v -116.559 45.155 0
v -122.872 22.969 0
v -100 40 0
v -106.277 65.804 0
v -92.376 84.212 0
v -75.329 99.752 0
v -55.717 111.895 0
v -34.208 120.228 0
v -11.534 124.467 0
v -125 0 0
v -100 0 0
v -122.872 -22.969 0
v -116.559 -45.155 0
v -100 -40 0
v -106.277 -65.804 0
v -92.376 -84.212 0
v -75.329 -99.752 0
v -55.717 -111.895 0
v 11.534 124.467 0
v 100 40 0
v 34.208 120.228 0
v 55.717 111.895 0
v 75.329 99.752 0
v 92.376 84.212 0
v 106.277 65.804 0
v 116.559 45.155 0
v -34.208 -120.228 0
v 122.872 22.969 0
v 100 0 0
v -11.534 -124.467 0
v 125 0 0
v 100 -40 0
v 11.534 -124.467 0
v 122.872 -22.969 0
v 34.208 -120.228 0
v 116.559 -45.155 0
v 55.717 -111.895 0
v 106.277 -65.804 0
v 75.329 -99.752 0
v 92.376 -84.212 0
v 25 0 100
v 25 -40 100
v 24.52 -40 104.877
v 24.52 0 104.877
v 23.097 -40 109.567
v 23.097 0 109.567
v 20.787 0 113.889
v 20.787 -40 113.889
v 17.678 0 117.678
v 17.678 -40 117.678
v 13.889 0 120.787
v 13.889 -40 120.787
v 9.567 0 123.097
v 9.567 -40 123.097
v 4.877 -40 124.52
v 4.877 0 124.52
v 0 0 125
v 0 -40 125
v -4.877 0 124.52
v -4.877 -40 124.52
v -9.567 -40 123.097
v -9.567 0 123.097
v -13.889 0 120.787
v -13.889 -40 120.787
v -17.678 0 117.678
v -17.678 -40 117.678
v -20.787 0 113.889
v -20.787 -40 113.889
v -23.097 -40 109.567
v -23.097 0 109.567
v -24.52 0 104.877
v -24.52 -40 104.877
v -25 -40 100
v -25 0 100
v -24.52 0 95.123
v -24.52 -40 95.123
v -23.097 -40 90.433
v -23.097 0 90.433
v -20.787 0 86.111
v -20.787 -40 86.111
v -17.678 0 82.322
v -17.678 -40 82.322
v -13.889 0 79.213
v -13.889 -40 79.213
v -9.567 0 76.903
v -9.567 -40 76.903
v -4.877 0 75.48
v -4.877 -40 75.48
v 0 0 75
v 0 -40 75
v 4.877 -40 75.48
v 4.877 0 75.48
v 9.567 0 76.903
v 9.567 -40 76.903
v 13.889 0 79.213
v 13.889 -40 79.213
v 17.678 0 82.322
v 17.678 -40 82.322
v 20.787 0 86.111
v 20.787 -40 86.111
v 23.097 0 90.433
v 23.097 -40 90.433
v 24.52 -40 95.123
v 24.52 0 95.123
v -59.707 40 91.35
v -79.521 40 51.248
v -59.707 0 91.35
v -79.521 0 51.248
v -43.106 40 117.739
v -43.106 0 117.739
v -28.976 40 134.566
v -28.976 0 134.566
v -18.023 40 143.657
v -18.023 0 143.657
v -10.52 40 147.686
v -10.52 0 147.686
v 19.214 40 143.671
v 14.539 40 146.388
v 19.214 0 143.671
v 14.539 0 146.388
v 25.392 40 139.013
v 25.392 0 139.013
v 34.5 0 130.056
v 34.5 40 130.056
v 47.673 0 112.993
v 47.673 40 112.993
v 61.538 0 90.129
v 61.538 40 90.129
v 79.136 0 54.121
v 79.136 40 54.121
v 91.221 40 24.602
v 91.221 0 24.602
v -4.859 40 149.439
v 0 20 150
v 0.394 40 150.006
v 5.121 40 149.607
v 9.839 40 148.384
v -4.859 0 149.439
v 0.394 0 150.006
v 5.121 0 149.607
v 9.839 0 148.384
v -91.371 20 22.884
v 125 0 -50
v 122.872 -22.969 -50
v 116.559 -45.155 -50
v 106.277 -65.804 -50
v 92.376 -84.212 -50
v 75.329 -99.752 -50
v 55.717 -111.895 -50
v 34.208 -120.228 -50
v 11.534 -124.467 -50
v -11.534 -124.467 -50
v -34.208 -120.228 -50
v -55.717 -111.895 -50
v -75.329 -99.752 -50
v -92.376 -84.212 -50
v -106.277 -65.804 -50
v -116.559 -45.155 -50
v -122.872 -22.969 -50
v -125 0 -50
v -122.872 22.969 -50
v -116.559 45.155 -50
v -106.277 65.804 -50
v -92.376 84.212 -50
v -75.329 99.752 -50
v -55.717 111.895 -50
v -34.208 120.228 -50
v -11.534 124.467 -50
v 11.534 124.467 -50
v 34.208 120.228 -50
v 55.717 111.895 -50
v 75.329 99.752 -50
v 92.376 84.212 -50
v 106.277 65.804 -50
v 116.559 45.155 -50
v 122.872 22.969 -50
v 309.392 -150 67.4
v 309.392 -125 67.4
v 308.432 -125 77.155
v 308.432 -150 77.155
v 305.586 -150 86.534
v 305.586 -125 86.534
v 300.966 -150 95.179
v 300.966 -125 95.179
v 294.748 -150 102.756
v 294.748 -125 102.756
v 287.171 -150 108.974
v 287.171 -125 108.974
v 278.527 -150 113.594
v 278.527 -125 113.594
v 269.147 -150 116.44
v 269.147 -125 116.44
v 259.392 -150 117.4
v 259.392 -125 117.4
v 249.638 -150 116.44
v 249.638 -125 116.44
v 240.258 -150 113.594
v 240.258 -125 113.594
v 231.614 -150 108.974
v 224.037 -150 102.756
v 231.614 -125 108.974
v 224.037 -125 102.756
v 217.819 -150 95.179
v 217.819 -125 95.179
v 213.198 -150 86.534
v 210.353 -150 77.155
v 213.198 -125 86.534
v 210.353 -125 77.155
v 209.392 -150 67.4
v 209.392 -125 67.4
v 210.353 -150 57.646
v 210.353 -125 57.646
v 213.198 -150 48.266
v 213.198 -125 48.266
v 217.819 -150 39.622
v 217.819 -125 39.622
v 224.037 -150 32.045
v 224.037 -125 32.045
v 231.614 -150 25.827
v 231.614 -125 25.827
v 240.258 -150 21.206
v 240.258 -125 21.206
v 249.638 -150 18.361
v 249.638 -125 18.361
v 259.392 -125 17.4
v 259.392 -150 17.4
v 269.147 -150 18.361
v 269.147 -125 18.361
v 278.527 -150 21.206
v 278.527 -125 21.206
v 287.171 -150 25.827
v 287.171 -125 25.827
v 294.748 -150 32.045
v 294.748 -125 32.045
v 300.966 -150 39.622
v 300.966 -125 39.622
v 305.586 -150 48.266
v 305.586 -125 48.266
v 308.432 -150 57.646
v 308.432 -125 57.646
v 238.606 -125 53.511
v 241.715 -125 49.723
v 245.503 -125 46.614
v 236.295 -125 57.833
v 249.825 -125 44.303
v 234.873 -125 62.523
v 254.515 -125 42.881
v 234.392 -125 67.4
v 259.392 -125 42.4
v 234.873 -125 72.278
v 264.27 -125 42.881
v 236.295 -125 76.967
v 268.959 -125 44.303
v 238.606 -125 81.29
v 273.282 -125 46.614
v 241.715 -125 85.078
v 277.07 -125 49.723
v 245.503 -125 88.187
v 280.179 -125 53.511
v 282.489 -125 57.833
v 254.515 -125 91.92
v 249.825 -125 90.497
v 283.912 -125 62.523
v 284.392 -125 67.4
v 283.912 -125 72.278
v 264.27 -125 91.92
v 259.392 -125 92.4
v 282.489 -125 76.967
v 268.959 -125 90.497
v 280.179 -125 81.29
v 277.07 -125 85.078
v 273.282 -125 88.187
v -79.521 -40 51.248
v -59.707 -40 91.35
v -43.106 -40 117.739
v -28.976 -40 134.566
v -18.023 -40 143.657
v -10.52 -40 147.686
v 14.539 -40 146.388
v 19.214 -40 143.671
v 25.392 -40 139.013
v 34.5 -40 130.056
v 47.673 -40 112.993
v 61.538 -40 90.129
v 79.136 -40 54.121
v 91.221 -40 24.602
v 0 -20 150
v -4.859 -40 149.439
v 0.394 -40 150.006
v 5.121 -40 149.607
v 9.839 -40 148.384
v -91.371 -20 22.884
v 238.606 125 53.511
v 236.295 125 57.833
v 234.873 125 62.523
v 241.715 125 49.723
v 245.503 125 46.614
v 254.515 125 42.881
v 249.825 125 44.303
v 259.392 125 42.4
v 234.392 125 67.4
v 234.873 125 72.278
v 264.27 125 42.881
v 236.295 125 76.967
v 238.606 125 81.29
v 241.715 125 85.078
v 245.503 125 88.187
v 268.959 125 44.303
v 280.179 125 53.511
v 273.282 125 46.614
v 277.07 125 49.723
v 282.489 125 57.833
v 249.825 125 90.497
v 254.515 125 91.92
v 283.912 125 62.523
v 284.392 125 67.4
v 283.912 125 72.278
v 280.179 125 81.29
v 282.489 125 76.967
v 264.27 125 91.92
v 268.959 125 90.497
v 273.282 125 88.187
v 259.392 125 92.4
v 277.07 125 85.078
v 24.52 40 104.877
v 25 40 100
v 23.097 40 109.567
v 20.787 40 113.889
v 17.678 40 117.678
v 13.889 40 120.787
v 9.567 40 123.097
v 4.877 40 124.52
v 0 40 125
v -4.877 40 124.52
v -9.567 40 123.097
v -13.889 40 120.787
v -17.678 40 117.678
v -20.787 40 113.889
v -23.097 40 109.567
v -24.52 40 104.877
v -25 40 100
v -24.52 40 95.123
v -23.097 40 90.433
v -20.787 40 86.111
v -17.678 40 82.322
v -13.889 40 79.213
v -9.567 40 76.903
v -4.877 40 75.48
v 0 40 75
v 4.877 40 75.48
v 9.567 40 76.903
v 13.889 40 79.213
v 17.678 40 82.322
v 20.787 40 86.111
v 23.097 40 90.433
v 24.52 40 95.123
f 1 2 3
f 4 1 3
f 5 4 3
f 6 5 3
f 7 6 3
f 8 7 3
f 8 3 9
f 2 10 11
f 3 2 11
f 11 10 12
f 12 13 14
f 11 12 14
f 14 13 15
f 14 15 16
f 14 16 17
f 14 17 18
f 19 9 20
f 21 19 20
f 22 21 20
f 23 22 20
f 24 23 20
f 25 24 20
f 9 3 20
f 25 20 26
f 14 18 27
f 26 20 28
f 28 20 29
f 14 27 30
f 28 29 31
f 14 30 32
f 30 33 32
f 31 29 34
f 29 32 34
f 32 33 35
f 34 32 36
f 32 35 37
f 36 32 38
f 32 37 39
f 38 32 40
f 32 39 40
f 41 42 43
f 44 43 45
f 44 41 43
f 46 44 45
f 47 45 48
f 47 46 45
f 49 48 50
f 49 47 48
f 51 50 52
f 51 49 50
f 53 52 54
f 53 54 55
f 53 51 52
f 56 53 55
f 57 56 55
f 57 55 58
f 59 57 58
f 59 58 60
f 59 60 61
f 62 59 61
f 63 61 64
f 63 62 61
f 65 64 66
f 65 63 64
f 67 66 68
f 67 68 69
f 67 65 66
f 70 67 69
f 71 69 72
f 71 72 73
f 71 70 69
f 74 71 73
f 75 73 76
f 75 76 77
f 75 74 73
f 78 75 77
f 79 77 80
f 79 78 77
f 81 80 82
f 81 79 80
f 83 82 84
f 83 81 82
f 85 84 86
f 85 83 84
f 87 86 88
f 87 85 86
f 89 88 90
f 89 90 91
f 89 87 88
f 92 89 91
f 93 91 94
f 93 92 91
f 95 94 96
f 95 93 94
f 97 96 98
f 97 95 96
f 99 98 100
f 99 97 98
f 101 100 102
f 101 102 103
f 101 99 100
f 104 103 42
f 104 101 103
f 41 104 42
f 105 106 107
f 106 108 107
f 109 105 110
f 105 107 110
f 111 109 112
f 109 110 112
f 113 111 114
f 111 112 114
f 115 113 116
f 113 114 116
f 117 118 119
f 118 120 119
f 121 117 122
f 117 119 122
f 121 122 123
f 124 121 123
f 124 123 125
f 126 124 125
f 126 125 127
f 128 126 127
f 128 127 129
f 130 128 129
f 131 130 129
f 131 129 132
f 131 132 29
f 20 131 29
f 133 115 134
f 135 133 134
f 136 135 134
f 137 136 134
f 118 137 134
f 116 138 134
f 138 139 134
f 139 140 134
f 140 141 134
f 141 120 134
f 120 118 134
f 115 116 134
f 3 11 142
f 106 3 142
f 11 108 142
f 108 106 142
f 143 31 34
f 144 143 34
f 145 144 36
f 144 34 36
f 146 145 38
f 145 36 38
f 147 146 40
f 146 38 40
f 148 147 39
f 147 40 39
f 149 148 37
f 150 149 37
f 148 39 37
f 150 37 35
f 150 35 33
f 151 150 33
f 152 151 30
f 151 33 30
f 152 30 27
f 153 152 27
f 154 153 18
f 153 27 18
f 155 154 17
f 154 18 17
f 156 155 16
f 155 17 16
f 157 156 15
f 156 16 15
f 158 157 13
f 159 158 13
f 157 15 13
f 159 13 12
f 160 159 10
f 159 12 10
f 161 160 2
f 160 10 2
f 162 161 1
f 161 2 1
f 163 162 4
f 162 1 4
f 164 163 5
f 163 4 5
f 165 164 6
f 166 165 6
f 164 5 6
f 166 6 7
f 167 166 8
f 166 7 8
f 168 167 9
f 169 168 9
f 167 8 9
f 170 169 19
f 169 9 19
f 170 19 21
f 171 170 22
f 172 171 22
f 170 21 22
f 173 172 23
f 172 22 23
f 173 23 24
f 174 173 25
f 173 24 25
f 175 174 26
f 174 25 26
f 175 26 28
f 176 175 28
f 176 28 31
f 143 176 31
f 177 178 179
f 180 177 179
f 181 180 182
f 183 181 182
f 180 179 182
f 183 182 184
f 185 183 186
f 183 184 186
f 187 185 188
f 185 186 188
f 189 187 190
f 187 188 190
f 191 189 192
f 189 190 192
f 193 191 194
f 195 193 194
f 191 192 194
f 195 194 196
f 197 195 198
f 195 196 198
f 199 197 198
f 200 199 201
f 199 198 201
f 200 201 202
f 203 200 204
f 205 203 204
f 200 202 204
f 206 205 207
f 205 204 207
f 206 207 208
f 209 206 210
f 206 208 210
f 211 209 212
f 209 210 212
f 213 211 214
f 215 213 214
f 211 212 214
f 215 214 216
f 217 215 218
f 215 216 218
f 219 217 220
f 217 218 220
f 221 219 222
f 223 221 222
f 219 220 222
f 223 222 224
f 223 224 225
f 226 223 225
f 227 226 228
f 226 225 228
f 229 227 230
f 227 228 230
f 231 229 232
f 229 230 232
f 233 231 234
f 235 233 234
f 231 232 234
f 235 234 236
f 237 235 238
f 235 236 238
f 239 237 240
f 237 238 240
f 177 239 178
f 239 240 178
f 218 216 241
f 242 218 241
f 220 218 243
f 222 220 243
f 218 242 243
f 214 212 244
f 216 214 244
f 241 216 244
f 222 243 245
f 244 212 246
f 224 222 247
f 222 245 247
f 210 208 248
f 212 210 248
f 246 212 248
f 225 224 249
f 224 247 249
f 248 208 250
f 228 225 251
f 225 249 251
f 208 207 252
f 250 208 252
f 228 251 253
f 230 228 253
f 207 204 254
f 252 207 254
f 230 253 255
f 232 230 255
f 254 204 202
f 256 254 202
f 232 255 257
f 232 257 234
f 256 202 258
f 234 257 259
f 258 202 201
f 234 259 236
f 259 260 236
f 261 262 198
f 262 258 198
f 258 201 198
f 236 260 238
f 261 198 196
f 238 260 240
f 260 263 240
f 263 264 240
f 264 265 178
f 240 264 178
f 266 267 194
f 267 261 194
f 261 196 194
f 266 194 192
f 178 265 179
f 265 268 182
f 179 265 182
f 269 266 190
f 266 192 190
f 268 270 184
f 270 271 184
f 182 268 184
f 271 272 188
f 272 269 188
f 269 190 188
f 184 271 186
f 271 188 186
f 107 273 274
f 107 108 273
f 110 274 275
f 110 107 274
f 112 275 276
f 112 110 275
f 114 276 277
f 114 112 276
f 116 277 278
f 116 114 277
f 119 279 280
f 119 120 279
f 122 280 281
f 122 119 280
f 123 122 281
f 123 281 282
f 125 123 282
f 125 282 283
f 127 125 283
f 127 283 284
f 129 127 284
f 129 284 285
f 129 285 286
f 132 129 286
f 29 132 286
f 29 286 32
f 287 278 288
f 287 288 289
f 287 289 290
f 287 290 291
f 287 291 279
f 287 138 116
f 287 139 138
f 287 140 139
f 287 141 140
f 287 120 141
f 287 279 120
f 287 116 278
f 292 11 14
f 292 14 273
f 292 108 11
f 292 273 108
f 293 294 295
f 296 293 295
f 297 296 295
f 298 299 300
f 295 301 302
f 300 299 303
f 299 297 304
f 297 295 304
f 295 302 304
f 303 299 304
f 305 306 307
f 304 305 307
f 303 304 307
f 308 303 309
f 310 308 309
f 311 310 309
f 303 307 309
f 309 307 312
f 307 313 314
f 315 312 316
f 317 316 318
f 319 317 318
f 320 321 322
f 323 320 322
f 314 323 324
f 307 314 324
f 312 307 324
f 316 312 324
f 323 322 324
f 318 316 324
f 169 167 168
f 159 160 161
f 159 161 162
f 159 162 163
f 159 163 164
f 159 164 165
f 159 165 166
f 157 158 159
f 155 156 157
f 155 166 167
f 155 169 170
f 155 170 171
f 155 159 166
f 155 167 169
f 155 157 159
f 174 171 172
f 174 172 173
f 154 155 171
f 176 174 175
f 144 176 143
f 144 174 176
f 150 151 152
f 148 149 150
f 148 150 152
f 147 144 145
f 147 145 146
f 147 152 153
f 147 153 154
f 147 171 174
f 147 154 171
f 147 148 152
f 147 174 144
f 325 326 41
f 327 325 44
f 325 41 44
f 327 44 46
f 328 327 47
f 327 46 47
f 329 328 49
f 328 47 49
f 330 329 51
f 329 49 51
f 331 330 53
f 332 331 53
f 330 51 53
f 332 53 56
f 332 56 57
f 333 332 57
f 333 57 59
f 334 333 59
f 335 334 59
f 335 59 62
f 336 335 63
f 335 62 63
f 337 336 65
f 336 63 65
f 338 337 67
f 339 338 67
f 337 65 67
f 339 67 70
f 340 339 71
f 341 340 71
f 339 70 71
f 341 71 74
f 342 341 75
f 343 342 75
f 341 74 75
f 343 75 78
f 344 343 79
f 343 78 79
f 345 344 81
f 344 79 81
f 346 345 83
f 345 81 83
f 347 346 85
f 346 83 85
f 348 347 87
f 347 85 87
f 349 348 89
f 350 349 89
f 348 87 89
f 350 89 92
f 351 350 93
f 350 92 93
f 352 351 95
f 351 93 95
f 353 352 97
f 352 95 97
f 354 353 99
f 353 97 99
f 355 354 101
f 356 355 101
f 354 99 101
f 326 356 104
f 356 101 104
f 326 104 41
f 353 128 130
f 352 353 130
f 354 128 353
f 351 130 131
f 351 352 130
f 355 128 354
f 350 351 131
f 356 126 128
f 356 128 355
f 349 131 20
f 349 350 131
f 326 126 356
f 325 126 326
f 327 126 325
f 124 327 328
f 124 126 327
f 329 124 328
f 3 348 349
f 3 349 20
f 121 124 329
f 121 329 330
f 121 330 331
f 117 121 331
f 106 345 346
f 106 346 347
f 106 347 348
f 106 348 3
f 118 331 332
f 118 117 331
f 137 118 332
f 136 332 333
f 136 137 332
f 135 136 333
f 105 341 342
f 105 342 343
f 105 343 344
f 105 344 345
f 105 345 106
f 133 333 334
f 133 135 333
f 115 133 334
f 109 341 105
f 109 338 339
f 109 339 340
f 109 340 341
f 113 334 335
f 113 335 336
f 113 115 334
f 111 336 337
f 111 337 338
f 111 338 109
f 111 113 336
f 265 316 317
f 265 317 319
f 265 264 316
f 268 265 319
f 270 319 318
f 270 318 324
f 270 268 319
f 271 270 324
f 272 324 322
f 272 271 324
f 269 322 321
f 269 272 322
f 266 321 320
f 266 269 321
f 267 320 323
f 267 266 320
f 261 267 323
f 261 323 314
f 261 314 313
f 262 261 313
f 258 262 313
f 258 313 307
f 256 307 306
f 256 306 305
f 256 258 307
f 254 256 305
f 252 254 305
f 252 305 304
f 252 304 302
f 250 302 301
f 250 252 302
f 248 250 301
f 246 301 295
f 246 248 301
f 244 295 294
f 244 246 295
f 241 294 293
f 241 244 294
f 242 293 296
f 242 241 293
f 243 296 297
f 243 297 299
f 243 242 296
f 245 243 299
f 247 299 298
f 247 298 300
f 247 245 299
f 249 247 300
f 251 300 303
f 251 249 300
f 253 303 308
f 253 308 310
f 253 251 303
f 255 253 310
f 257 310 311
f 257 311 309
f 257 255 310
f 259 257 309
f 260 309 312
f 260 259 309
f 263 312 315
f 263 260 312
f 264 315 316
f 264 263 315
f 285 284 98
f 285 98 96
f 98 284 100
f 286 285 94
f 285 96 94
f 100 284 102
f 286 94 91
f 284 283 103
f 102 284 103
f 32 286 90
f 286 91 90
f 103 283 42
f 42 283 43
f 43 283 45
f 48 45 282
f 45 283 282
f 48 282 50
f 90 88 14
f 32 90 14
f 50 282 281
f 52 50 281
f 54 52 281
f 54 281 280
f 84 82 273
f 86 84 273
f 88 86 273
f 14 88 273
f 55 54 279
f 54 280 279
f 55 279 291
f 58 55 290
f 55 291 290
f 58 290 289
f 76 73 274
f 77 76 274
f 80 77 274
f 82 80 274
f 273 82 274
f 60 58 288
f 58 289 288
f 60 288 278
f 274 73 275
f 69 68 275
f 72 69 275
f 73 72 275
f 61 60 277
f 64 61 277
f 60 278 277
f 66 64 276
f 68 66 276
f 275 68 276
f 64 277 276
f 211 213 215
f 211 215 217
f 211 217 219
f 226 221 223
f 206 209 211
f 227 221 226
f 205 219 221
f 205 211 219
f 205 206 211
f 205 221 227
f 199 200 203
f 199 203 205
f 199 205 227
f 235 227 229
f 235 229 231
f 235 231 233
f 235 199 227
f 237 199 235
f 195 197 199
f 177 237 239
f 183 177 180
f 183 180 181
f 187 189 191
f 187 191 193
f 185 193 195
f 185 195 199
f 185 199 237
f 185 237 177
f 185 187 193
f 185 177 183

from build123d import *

# Parameters (mm, degrees)
F0_R     = 25
F1_DEPTH = 40
F2_R     = 125
F3_DEPTH = 50
F4_R     = 25
F5_DEPTH = 125
F6_R     = 50
F7_DEPTH = 25


with BuildPart() as f1:
    # F0 (on Front) → F1 (new body, symmetric)
    with BuildSketch(Plane.XZ):
        with BuildLine():
            add(Edge.make_bspline(
                [(-100, 0), (-85, 41.621112), (0, 256.524127), (85, 45.330634), (100, 0)],
                knots=[0, 0, 0, 0, 180.277564, 360.555128, 360.555128, 360.555128, 360.555128], degree=3))
            Line((-100, 0), (100, 0))
        make_face()
        with Locations((0, 100)):
            Circle(F0_R, mode=Mode.SUBTRACT)
    extrude(amount=F1_DEPTH, both=True)

    # F2 (on face) → F3 (join)
    with BuildSketch(Plane(origin=(0, 0, 0), x_dir=(1, 0, 0), z_dir=(0, 0, -1))):
        Circle(F2_R)
        Polygon((100, 0), (100, -40), (-100, -40), (-100, 0), (-100, 40), (100, 40), align=None, mode=Mode.SUBTRACT)
        Polygon((-100, -40), (100, -40), (100, 0), (100, 40), (-100, 40), (-100, 0), align=None)
    extrude(amount=F3_DEPTH)


with BuildPart() as f5:
    # F4 (on Front) → F5 (new body, symmetric)
    with BuildSketch(Plane.XZ):
        with Locations((259.392381, 67.400299)):
            Circle(F4_R)
    extrude(amount=F5_DEPTH, both=True)

    # F6 (on face) → F7 (join)
    with BuildSketch(Plane.XZ.offset(125)):
        with Locations((259.392381, 67.400299)):
            Circle(F6_R)
    extrude(amount=F7_DEPTH)


solid = Compound([f1.part, f5.part])
